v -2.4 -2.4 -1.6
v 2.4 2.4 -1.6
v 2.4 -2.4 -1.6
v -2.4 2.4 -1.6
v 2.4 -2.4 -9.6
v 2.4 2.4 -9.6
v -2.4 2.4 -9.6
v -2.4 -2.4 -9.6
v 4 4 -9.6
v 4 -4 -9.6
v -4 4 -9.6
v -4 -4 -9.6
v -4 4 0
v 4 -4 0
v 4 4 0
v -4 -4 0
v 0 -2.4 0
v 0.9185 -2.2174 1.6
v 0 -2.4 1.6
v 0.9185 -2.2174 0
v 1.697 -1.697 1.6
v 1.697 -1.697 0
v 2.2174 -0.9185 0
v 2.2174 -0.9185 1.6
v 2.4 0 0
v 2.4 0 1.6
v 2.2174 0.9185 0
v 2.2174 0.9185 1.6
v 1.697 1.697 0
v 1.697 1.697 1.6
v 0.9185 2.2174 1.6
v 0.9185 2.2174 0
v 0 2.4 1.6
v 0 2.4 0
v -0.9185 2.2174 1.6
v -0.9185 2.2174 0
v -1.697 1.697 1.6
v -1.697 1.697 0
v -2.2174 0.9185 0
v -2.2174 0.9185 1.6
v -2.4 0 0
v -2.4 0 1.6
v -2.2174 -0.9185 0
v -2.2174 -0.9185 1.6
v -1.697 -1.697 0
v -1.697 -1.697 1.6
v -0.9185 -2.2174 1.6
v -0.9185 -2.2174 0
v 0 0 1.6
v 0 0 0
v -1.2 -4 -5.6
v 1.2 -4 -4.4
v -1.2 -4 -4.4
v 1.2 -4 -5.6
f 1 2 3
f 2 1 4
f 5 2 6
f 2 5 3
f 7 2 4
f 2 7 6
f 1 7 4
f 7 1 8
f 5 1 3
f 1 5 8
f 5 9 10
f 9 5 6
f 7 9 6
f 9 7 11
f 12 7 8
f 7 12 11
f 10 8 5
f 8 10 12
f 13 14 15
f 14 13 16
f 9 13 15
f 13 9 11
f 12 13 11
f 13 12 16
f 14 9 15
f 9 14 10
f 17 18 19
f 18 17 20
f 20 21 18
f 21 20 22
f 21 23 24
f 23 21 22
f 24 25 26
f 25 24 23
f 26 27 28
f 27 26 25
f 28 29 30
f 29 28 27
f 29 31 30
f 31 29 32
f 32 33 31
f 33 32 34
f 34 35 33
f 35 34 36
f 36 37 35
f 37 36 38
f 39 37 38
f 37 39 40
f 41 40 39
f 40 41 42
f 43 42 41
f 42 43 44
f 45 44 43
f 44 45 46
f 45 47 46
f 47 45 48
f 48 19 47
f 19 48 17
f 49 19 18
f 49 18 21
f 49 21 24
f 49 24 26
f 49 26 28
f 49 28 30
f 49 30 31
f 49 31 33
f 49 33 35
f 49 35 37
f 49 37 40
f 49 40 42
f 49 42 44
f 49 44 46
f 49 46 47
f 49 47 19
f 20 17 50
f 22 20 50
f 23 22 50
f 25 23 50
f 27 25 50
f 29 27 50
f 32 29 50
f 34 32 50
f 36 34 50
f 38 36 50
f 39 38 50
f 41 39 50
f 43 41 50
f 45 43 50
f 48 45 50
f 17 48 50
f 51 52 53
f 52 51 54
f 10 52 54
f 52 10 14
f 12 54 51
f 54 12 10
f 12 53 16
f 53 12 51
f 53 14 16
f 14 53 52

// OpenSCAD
// file: ../p/4-4edge.scad
use <../lib.scad>
function ldraw_lib__4_4edge() = [
// 0 Circle 1.0
// 0 Name: 4-4edge.dat
// 0 Author: James Jessiman
// 0 !LDRAW_ORG Primitive UPDATE 2017-01
// 0 !LICENSE Licensed under CC BY 2.0 and CC BY 4.0 : see CAreadme.txt
// 
// 0 BFC CERTIFY CCW
  [0,"BFC","CERTIFY"],
  [0,"BFC","CCW"],
// 
// 0 !HISTORY 1998-12-15 [PTadmin] Official Update 1998-10
// 0 !HISTORY 2005-12-28 [PTadmin] Official Update 2005-01
// 0 !HISTORY 2007-06-24 [PTadmin] Header formatted for Contributor Agreement
// 0 !HISTORY 2008-07-01 [PTadmin] Official Update 2008-01
// 0 !HISTORY 2017-01-15 [Steffen] BFCed
// 0 !HISTORY 2017-12-30 [PTadmin] Official Update 2017-01
// 
// 
// 2 24 1 0 0 0.9239 0 0.3827
  [2,24,1,0,0,0.9239,0,0.3827],
// 2 24 0.9239 0 0.3827 0.7071 0 0.7071
  [2,24,0.9239,0,0.3827,0.7071,0,0.7071],
// 2 24 0.7071 0 0.7071 0.3827 0 0.9239
  [2,24,0.7071,0,0.7071,0.3827,0,0.9239],
// 2 24 0.3827 0 0.9239 0 0 1
  [2,24,0.3827,0,0.9239,0,0,1],
// 2 24 0 0 1 -0.3827 0 0.9239
  [2,24,0,0,1,-0.3827,0,0.9239],
// 2 24 -0.3827 0 0.9239 -0.7071 0 0.7071
  [2,24,-0.3827,0,0.9239,-0.7071,0,0.7071],
// 2 24 -0.7071 0 0.7071 -0.9239 0 0.3827
  [2,24,-0.7071,0,0.7071,-0.9239,0,0.3827],
// 2 24 -0.9239 0 0.3827 -1 0 -0
  [2,24,-0.9239,0,0.3827,-1,0,-0],
// 2 24 -1 0 -0 -0.9239 0 -0.3827
  [2,24,-1,0,-0,-0.9239,0,-0.3827],
// 2 24 -0.9239 0 -0.3827 -0.7071 0 -0.7071
  [2,24,-0.9239,0,-0.3827,-0.7071,0,-0.7071],
// 2 24 -0.7071 0 -0.7071 -0.3827 0 -0.9239
  [2,24,-0.7071,0,-0.7071,-0.3827,0,-0.9239],
// 2 24 -0.3827 0 -0.9239 0 0 -1
  [2,24,-0.3827,0,-0.9239,0,0,-1],
// 2 24 0 0 -1 0.3827 0 -0.9239
  [2,24,0,0,-1,0.3827,0,-0.9239],
// 2 24 0.3827 0 -0.9239 0.7071 0 -0.7071
  [2,24,0.3827,0,-0.9239,0.7071,0,-0.7071],
// 2 24 0.7071 0 -0.7071 0.9239 0 -0.3827
  [2,24,0.7071,0,-0.7071,0.9239,0,-0.3827],
// 2 24 0.9239 0 -0.3827 1 0 0
  [2,24,0.9239,0,-0.3827,1,0,0],
];
module ldraw_lib__4_4edge(step=0, col=false, unit=2/5, alt=false, line=0.2, solid=!$preview)
    makepoly(ldraw_lib__4_4edge(), step=step, col=col, unit=unit, alt=alt, line=line, solid=solid);
ldraw_lib__4_4edge(line=0.2);
// file: ../p/4-4disc.scad
use <../lib.scad>
function ldraw_lib__4_4disc() = [
// 0 Disc 1.0
// 0 Name: 4-4disc.dat
// 0 Author: James Jessiman
// 0 !LDRAW_ORG Primitive UPDATE 2002-02
// 0 !LICENSE Licensed under CC BY 2.0 and CC BY 4.0 : see CAreadme.txt
// 
// 0 BFC CERTIFY CCW
  [0,"BFC","CERTIFY"],
  [0,"BFC","CCW"],
// 
// 0 !HISTORY 1998-12-15 [PTadmin] Official Update 1998-10
// 0 !HISTORY 2002-03-23 [sbliss] Added BFC statement
// 0 !HISTORY 2002-04-25 [PTadmin] Official Update 2002-02
// 0 !HISTORY 2007-06-24 [PTadmin] Header formatted for Contributor Agreement
// 0 !HISTORY 2008-07-01 [PTadmin] Official Update 2008-01
// 
// 
// 3 16 0 0 0 1 0 0 0.9239 0 0.3827
  [3,16,0,0,0,1,0,0,0.9239,0,0.3827],
// 3 16 0 0 0 0.9239 0 0.3827 0.7071 0 0.7071
  [3,16,0,0,0,0.9239,0,0.3827,0.7071,0,0.7071],
// 3 16 0 0 0 0.7071 0 0.7071 0.3827 0 0.9239
  [3,16,0,0,0,0.7071,0,0.7071,0.3827,0,0.9239],
// 3 16 0 0 0 0.3827 0 0.9239 0 0 1
  [3,16,0,0,0,0.3827,0,0.9239,0,0,1],
// 3 16 0 0 0 0 0 1 -0.3827 0 0.9239
  [3,16,0,0,0,0,0,1,-0.3827,0,0.9239],
// 3 16 0 0 0 -0.3827 0 0.9239 -0.7071 0 0.7071
  [3,16,0,0,0,-0.3827,0,0.9239,-0.7071,0,0.7071],
// 3 16 0 0 0 -0.7071 0 0.7071 -0.9239 0 0.3827
  [3,16,0,0,0,-0.7071,0,0.7071,-0.9239,0,0.3827],
// 3 16 0 0 0 -0.9239 0 0.3827 -1 0 -0
  [3,16,0,0,0,-0.9239,0,0.3827,-1,0,-0],
// 3 16 0 0 0 -1 0 -0 -0.9239 0 -0.3827
  [3,16,0,0,0,-1,0,-0,-0.9239,0,-0.3827],
// 3 16 0 0 0 -0.9239 0 -0.3827 -0.7071 0 -0.7071
  [3,16,0,0,0,-0.9239,0,-0.3827,-0.7071,0,-0.7071],
// 3 16 0 0 0 -0.7071 0 -0.7071 -0.3827 0 -0.9239
  [3,16,0,0,0,-0.7071,0,-0.7071,-0.3827,0,-0.9239],
// 3 16 0 0 0 -0.3827 0 -0.9239 0 0 -1
  [3,16,0,0,0,-0.3827,0,-0.9239,0,0,-1],
// 3 16 0 0 0 0 0 -1 0.3827 0 -0.9239
  [3,16,0,0,0,0,0,-1,0.3827,0,-0.9239],
// 3 16 0 0 0 0.3827 0 -0.9239 0.7071 0 -0.7071
  [3,16,0,0,0,0.3827,0,-0.9239,0.7071,0,-0.7071],
// 3 16 0 0 0 0.7071 0 -0.7071 0.9239 0 -0.3827
  [3,16,0,0,0,0.7071,0,-0.7071,0.9239,0,-0.3827],
// 3 16 0 0 0 0.9239 0 -0.3827 1 0 0
  [3,16,0,0,0,0.9239,0,-0.3827,1,0,0],
// 0
];
module ldraw_lib__4_4disc(step=0, col=false, unit=2/5, alt=false, line=0.2, solid=!$preview)
    makepoly(ldraw_lib__4_4disc(), step=step, col=col, unit=unit, alt=alt, line=line, solid=solid);
ldraw_lib__4_4disc(line=0.2);
// file: ../p/4-4cyli.scad
use <../lib.scad>
$fa=1; $fs=0.2;
function ldraw_lib__4_4cyli(realsolid=false) = [
// 0 Cylinder 1.0
// 0 Name: 4-4cyli.dat
// 0 Author: James Jessiman
// 0 !LDRAW_ORG Primitive UPDATE 2005-01
// 0 !LICENSE Licensed under CC BY 2.0 and CC BY 4.0 : see CAreadme.txt
// 
// 0 BFC CERTIFY CCW
  [0,"BFC","CERTIFY"],
  [0,"BFC","CCW"],
// 
// 0 !HISTORY 1998-12-15 [PTadmin] Official Update 1998-10
// 0 !HISTORY 2002-03-23 [sbliss] Added BFC statement; merged headers from files in distributions LDraw 0.27 and Complete.
// 0 !HISTORY 2002-04-25 [PTadmin] Official Update 2002-02
// 0 !HISTORY 2004-12-14 [guyvivan] BFC CCW
// 0 !HISTORY 2005-12-28 [PTadmin] Official Update 2005-01
// 0 !HISTORY 2007-06-24 [PTadmin] Header formatted for Contributor Agreement
// 0 !HISTORY 2008-07-01 [PTadmin] Official Update 2008-01
// 
// 
// 4 16 1 1 0 0.9239 1 0.3827 0.9239 0 0.3827 1 0 0
  [4,16,1,1,0,0.9239,1,0.3827,0.9239,0,0.3827,1,0,0],
// 5 24 1 0 0 1 1 0 0.9239 0 0.3827 0.9239 0 -0.3827
  [5,24,1,0,0,1,1,0,0.9239,0,0.3827,0.9239,0,-0.3827],
// 4 16 0.9239 1 0.3827 0.7071 1 0.7071 0.7071 0 0.7071 0.9239 0 0.3827
  [4,16,0.9239,1,0.3827,0.7071,1,0.7071,0.7071,0,0.7071,0.9239,0,0.3827],
// 5 24 0.9239 0 0.3827 0.9239 1 0.3827 0.7071 0 0.7071 1 0 0
  [5,24,0.9239,0,0.3827,0.9239,1,0.3827,0.7071,0,0.7071,1,0,0],
// 4 16 0.7071 1 0.7071 0.3827 1 0.9239 0.3827 0 0.9239 0.7071 0 0.7071
  [4,16,0.7071,1,0.7071,0.3827,1,0.9239,0.3827,0,0.9239,0.7071,0,0.7071],
// 5 24 0.7071 0 0.7071 0.7071 1 0.7071 0.3827 0 0.9239 0.9239 0 0.3827
  [5,24,0.7071,0,0.7071,0.7071,1,0.7071,0.3827,0,0.9239,0.9239,0,0.3827],
// 4 16 0.3827 1 0.9239 0 1 1 0 0 1 0.3827 0 0.9239
  [4,16,0.3827,1,0.9239,0,1,1,0,0,1,0.3827,0,0.9239],
// 5 24 0.3827 0 0.9239 0.3827 1 0.9239 0 0 1 0.7071 0 0.7071
  [5,24,0.3827,0,0.9239,0.3827,1,0.9239,0,0,1,0.7071,0,0.7071],
// 4 16 0 1 1 -0.3827 1 0.9239 -0.3827 0 0.9239 0 0 1
  [4,16,0,1,1,-0.3827,1,0.9239,-0.3827,0,0.9239,0,0,1],
// 5 24 0 0 1 0 1 1 -0.3827 0 0.9239 0.3827 0 0.9239
  [5,24,0,0,1,0,1,1,-0.3827,0,0.9239,0.3827,0,0.9239],
// 4 16 -0.3827 1 0.9239 -0.7071 1 0.7071 -0.7071 0 0.7071 -0.3827 0 0.9239
  [4,16,-0.3827,1,0.9239,-0.7071,1,0.7071,-0.7071,0,0.7071,-0.3827,0,0.9239],
// 5 24 -0.3827 0 0.9239 -0.3827 1 0.9239 -0.7071 0 0.7071 0 0 1
  [5,24,-0.3827,0,0.9239,-0.3827,1,0.9239,-0.7071,0,0.7071,0,0,1],
// 4 16 -0.7071 1 0.7071 -0.9239 1 0.3827 -0.9239 0 0.3827 -0.7071 0 0.7071
  [4,16,-0.7071,1,0.7071,-0.9239,1,0.3827,-0.9239,0,0.3827,-0.7071,0,0.7071],
// 5 24 -0.7071 0 0.7071 -0.7071 1 0.7071 -0.9239 0 0.3827 -0.3827 0 0.9239
  [5,24,-0.7071,0,0.7071,-0.7071,1,0.7071,-0.9239,0,0.3827,-0.3827,0,0.9239],
// 4 16 -0.9239 1 0.3827 -1 1 0 -1 0 0 -0.9239 0 0.3827
  [4,16,-0.9239,1,0.3827,-1,1,0,-1,0,0,-0.9239,0,0.3827],
// 5 24 -0.9239 0 0.3827 -0.9239 1 0.3827 -1 0 0 -0.7071 0 0.7071
  [5,24,-0.9239,0,0.3827,-0.9239,1,0.3827,-1,0,0,-0.7071,0,0.7071],
// 4 16 -1 1 0 -0.9239 1 -0.3827 -0.9239 0 -0.3827 -1 0 0
  [4,16,-1,1,0,-0.9239,1,-0.3827,-0.9239,0,-0.3827,-1,0,0],
// 5 24 -1 0 0 -1 1 0 -0.9239 0 -0.3827 -0.9239 0 0.3827
  [5,24,-1,0,0,-1,1,0,-0.9239,0,-0.3827,-0.9239,0,0.3827],
// 4 16 -0.9239 1 -0.3827 -0.7071 1 -0.7071 -0.7071 0 -0.7071 -0.9239 0 -0.3827
  [4,16,-0.9239,1,-0.3827,-0.7071,1,-0.7071,-0.7071,0,-0.7071,-0.9239,0,-0.3827],
// 5 24 -0.9239 0 -0.3827 -0.9239 1 -0.3827 -0.7071 0 -0.7071 -1 0 0
  [5,24,-0.9239,0,-0.3827,-0.9239,1,-0.3827,-0.7071,0,-0.7071,-1,0,0],
// 4 16 -0.7071 1 -0.7071 -0.3827 1 -0.9239 -0.3827 0 -0.9239 -0.7071 0 -0.7071
  [4,16,-0.7071,1,-0.7071,-0.3827,1,-0.9239,-0.3827,0,-0.9239,-0.7071,0,-0.7071],
// 5 24 -0.7071 0 -0.7071 -0.7071 1 -0.7071 -0.3827 0 -0.9239 -0.9239 0 -0.3827
  [5,24,-0.7071,0,-0.7071,-0.7071,1,-0.7071,-0.3827,0,-0.9239,-0.9239,0,-0.3827],
// 4 16 -0.3827 1 -0.9239 0 1 -1 0 0 -1 -0.3827 0 -0.9239
  [4,16,-0.3827,1,-0.9239,0,1,-1,0,0,-1,-0.3827,0,-0.9239],
// 5 24 -0.3827 0 -0.9239 -0.3827 1 -0.9239 0 0 -1 -0.7071 0 -0.7071
  [5,24,-0.3827,0,-0.9239,-0.3827,1,-0.9239,0,0,-1,-0.7071,0,-0.7071],
// 4 16 0 1 -1 0.3827 1 -0.9239 0.3827 0 -0.9239 0 0 -1
  [4,16,0,1,-1,0.3827,1,-0.9239,0.3827,0,-0.9239,0,0,-1],
// 5 24 0 0 -1 0 1 -1 0.3827 0 -0.9239 -0.3827 0 -0.9239
  [5,24,0,0,-1,0,1,-1,0.3827,0,-0.9239,-0.3827,0,-0.9239],
// 4 16 0.3827 1 -0.9239 0.7071 1 -0.7071 0.7071 0 -0.7071 0.3827 0 -0.9239
  [4,16,0.3827,1,-0.9239,0.7071,1,-0.7071,0.7071,0,-0.7071,0.3827,0,-0.9239],
// 5 24 0.3827 0 -0.9239 0.3827 1 -0.9239 0.7071 0 -0.7071 0 0 -1
  [5,24,0.3827,0,-0.9239,0.3827,1,-0.9239,0.7071,0,-0.7071,0,0,-1],
// 4 16 0.7071 1 -0.7071 0.9239 1 -0.3827 0.9239 0 -0.3827 0.7071 0 -0.7071
  [4,16,0.7071,1,-0.7071,0.9239,1,-0.3827,0.9239,0,-0.3827,0.7071,0,-0.7071],
// 5 24 0.7071 0 -0.7071 0.7071 1 -0.7071 0.9239 0 -0.3827 0.3827 0 -0.9239
  [5,24,0.7071,0,-0.7071,0.7071,1,-0.7071,0.9239,0,-0.3827,0.3827,0,-0.9239],
// 4 16 0.9239 1 -0.3827 1 1 0 1 0 0 0.9239 0 -0.3827
  [4,16,0.9239,1,-0.3827,1,1,0,1,0,0,0.9239,0,-0.3827],
// 5 24 0.9239 0 -0.3827 0.9239 1 -0.3827 1 0 0 0.7071 0 -0.7071
  [5,24,0.9239,0,-0.3827,0.9239,1,-0.3827,1,0,0,0.7071,0,-0.7071],
// 0
];
module ldraw_lib__4_4cyli(step=0, col=false, unit=2/5, alt=false, line=0.2, solid=!$preview)
    makepoly(ldraw_lib__4_4cyli(solid), step=step, col=col, unit=unit, alt=alt, line=line, solid=solid);
ldraw_lib__4_4cyli(line=0.2);
// file: ../p/stud.scad
use <../lib.scad>
use <4-4cyli.scad>
use <4-4disc.scad>
use <4-4edge.scad>
function ldraw_lib__stud() = [
// 0 Stud
// 0 Name: stud.dat
// 0 Author: James Jessiman
// 0 !LDRAW_ORG Primitive UPDATE 2012-01
// 0 !LICENSE Licensed under CC BY 4.0 : see CAreadme.txt
// 
// 0 BFC CERTIFY CCW
  [0,"BFC","CERTIFY"],
  [0,"BFC","CCW"],
// 
// 0 !HISTORY 2002-04-04 [sbliss] Modified for BFC compliance
// 0 !HISTORY 2002-04-25 [PTadmin] Official Update 2002-02
// 0 !HISTORY 2007-06-24 [PTadmin] Header formatted for Contributor Agreement
// 0 !HISTORY 2008-07-01 [PTadmin] Official Update 2008-01
// 0 !HISTORY 2012-02-16 [Philo] Changed to CCW
// 0 !HISTORY 2012-03-30 [PTadmin] Official Update 2012-01
// 
// 
// 1 16 0 0 0 6 0 0 0 1 0 0 0 6 4-4edge.dat
  [1,16,0,0,0,6,0,0,0,1,0,0,0,6, ldraw_lib__4_4edge()],
// 1 16 0 -4 0 6 0 0 0 1 0 0 0 6 4-4edge.dat
  [1,16,0,-4,0,6,0,0,0,1,0,0,0,6, ldraw_lib__4_4edge()],
// 1 16 0 0 0 6 0 0 0 -4 0 0 0 6 4-4cyli.dat
  [1,16,0,0,0,6,0,0,0,-4,0,0,0,6, ldraw_lib__4_4cyli()],
// 1 16 0 -4 0 6 0 0 0 1 0 0 0 6 4-4disc.dat
  [1,16,0,-4,0,6,0,0,0,1,0,0,0,6, ldraw_lib__4_4disc()],
  [-1,16,0,0,0,6,0,0,0,-1,0,0,0,6, ldraw_lib__4_4disc()],
];
module ldraw_lib__stud(step=0, col=false, unit=2/5, alt=false, line=0.2, solid=!$preview)
    makepoly(ldraw_lib__stud(), step=step, col=col, unit=unit, alt=alt, line=line, solid=solid);
ldraw_lib__stud(line=0.2);
// file: ../p/box5.scad
use <../lib.scad>
function ldraw_lib__box5() = [
// 0 Box with 5 Faces and All Edges
// 0 Name: box5.dat
// 0 Author: James Jessiman
// 0 !LDRAW_ORG Primitive UPDATE 2012-01
// 0 !LICENSE Licensed under CC BY 2.0 and CC BY 4.0 : see CAreadme.txt
// 
// 0 BFC CERTIFY CCW
  [0,"BFC","CERTIFY"],
  [0,"BFC","CCW"],
// 
// 0 !HISTORY 2002-04-03 [sbliss] Modified for BFC compliance
// 0 !HISTORY 2002-04-25 [PTadmin] Official Update 2002-02
// 0 !HISTORY 2007-06-24 [PTadmin] Header formatted for Contributor Agreement
// 0 !HISTORY 2008-07-01 [PTadmin] Official Update 2008-01
// 0 !HISTORY 2012-02-16 [Philo] Changed to CCW
// 0 !HISTORY 2012-03-30 [PTadmin] Official Update 2012-01
// 
// 
// 2 24 1 1 1 -1 1 1
  [2,24,1,1,1,-1,1,1],
// 2 24 -1 1 1 -1 1 -1
  [2,24,-1,1,1,-1,1,-1],
// 2 24 -1 1 -1 1 1 -1
  [2,24,-1,1,-1,1,1,-1],
// 2 24 1 1 -1 1 1 1
  [2,24,1,1,-1,1,1,1],
// 2 24 1 0 1 -1 0 1
  [2,24,1,0,1,-1,0,1],
// 2 24 -1 0 1 -1 0 -1
  [2,24,-1,0,1,-1,0,-1],
// 2 24 -1 0 -1 1 0 -1
  [2,24,-1,0,-1,1,0,-1],
// 2 24 1 0 -1 1 0 1
  [2,24,1,0,-1,1,0,1],
// 2 24 1 0 1 1 1 1
  [2,24,1,0,1,1,1,1],
// 2 24 -1 0 1 -1 1 1
  [2,24,-1,0,1,-1,1,1],
// 2 24 1 0 -1 1 1 -1
  [2,24,1,0,-1,1,1,-1],
// 2 24 -1 0 -1 -1 1 -1
  [2,24,-1,0,-1,-1,1,-1],
// 4 16 -1 1 1 1 1 1 1 1 -1 -1 1 -1
  [4,16,-1,1,1,1,1,1,1,1,-1,-1,1,-1],
// 4 16 -1 1 1 -1 0 1 1 0 1 1 1 1
  [4,16,-1,1,1,-1,0,1,1,0,1,1,1,1],
// 4 16 -1 1 -1 -1 0 -1 -1 0 1 -1 1 1
  [4,16,-1,1,-1,-1,0,-1,-1,0,1,-1,1,1],
// 4 16 1 1 -1 1 0 -1 -1 0 -1 -1 1 -1
  [4,16,1,1,-1,1,0,-1,-1,0,-1,-1,1,-1],
// 4 16 1 1 1 1 0 1 1 0 -1 1 1 -1
  [4,16,1,1,1,1,0,1,1,0,-1,1,1,-1],
];
makepoly(ldraw_lib__box5(), line=0.2);
// file: ../p/box4t.scad
use <../lib.scad>
function ldraw_lib__box4t() = [
// 0 Box with 4 Adjacent Faces and All Edges
// 0 Name: box4t.dat
// 0 Author: Tore Eriksson [Tore_Eriksson]
// 0 !LDRAW_ORG Primitive UPDATE 2003-02
// 0 !LICENSE Licensed under CC BY 2.0 and CC BY 4.0 : see CAreadme.txt
// 
// 0 BFC CERTIFY CCW
  [0,"BFC","CERTIFY"],
  [0,"BFC","CCW"],
// 
// 0 !HISTORY 1997-09-29 [PTadmin] Official Update 1997-15
// 0 !HISTORY 2002-08-31 [izanette] Modified with WINDZ for BFC compliance
// 0 !HISTORY 2003-08-01 [PTadmin] Official Update 2003-02
// 0 !HISTORY 2007-06-24 [PTadmin] Header formatted for Contributor Agreement
// 0 !HISTORY 2008-07-01 [PTadmin] Official Update 2008-01
// 
// 
// 2 24 1 1 1 -1 1 1
  [2,24,1,1,1,-1,1,1],
// 2 24 -1 1 1 -1 1 -1
  [2,24,-1,1,1,-1,1,-1],
// 2 24 -1 1 -1 1 1 -1
  [2,24,-1,1,-1,1,1,-1],
// 2 24 1 1 -1 1 1 1
  [2,24,1,1,-1,1,1,1],
// 2 24 1 0 1 -1 0 1
  [2,24,1,0,1,-1,0,1],
// 2 24 -1 0 1 -1 0 -1
  [2,24,-1,0,1,-1,0,-1],
// 2 24 -1 0 -1 1 0 -1
  [2,24,-1,0,-1,1,0,-1],
// 2 24 1 0 -1 1 0 1
  [2,24,1,0,-1,1,0,1],
// 2 24 1 0 1 1 1 1
  [2,24,1,0,1,1,1,1],
// 2 24 -1 0 1 -1 1 1
  [2,24,-1,0,1,-1,1,1],
// 2 24 1 0 -1 1 1 -1
  [2,24,1,0,-1,1,1,-1],
// 2 24 -1 0 -1 -1 1 -1
  [2,24,-1,0,-1,-1,1,-1],
// 4 16 1 1 1 1 1 -1 -1 1 -1 -1 1 1
  [4,16,1,1,1,1,1,-1,-1,1,-1,-1,1,1],
// 4 16 1 1 1 -1 1 1 -1 0 1 1 0 1
  [4,16,1,1,1,-1,1,1,-1,0,1,1,0,1],
// 4 16 -1 1 1 -1 1 -1 -1 0 -1 -1 0 1
  [4,16,-1,1,1,-1,1,-1,-1,0,-1,-1,0,1],
// 0 4 16 -1 1 -1 -1 0 -1 1 0 -1 1 1 -1
// 4 16 1 1 -1 1 1 1 1 0 1 1 0 -1
  [4,16,1,1,-1,1,1,1,1,0,1,1,0,-1],
// 0
];
makepoly(ldraw_lib__box4t(), line=0.2);
// file: s/3005s01.scad
use <../../lib.scad>
use <../../p/box4t.scad>
use <../../p/box5.scad>
use <../../p/stud.scad>
function ldraw_lib__s__3005s01() = [
// 0 ~Brick  1 x  1 without Front Face
// 0 Name: s\3005s01.dat
// 0 Author: John Riley [jriley]
// 0 !LDRAW_ORG Subpart UPDATE 2004-01
// 0 !LICENSE Licensed under CC BY 2.0 and CC BY 4.0 : see CAreadme.txt
// 
// 0 BFC CERTIFY CCW
  [0,"BFC","CERTIFY"],
  [0,"BFC","CCW"],
// 
// 0 !HISTORY 2003-09-07 [jriley] BFCed & Subfiled
// 0 !HISTORY 2004-03-02 [PTadmin] Official Update 2004-01
// 0 !HISTORY 2007-08-29 [PTadmin] Header formatted for Contributor Agreement
// 0 !HISTORY 2008-07-01 [PTadmin] Official Update 2008-01
// 
// 
// 0 BFC INVERTNEXT
  [0,"BFC","INVERTNEXT"],
// 1 16 0 24 0 0 0 6 0 -20 0 -6 0 0 box5.dat
  [1,16,0,24,0,0,0,6,0,-20,0,-6,0,0, ldraw_lib__box5()],
// 4 16 10 24 -10 6 24 -6 6 24 6 10 24 10
  [4,16,10,24,-10,6,24,-6,6,24,6,10,24,10],
// 4 16 10 24 10 6 24 6 -6 24 6 -10 24 10
  [4,16,10,24,10,6,24,6,-6,24,6,-10,24,10],
// 4 16 -10 24 10 -6 24 6 -6 24 -6 -10 24 -10
  [4,16,-10,24,10,-6,24,6,-6,24,-6,-10,24,-10],
// 4 16 -10 24 -10 -6 24 -6 6 24 -6 10 24 -10
  [4,16,-10,24,-10,-6,24,-6,6,24,-6,10,24,-10],
// 1 16 0 24 0 10 0 0 0 -24 0 0 0 10 box4t.dat
  [1,16,0,24,0,10,0,0,0,-24,0,0,0,10, ldraw_lib__box4t()],
// 1 16 0 0 0 0 0 1 0 1 0 -1 0 0 stud.dat
  [1,16,0,0,0,0,0,1,0,1,0,-1,0,0, ldraw_lib__stud()],
// 0
];
module ldraw_lib__s__3005s01(step=0, col=false, unit=2/5, alt=false, line=0.2, solid=!$preview)
    makepoly(ldraw_lib__s__3005s01(), step=step, col=col, unit=unit, alt=alt, line=line, solid=solid);
ldraw_lib__s__3005s01(line=0.2);
// main file
use <../lib.scad>
use <s/3005s01.scad>
function ldraw_lib__3005pwm() = [
// 0 Brick  1 x  1 with Lightblue Subtraction Pattern
// 0 Name: 3005pwm.dat
// 0 Author: Tore Eriksson [Tore_Eriksson]
// 0 !LDRAW_ORG Part UPDATE 2025-09
// 0 !LICENSE Licensed under CC BY 4.0 : see CAreadme.txt
// 
// 0 BFC CERTIFY CCW
  [0,"BFC","CERTIFY"],
  [0,"BFC","CCW"],
// 
// 0 !KEYWORDS dash, letters, minus, numbers, Set Unknown
// 
// 0 !HISTORY 2004-04-22 [PTadmin] Official Update 2004-02
// 0 !HISTORY 2007-05-11 [PTadmin] Header formatted for Contributor Agreement
// 0 !HISTORY 2008-07-01 [PTadmin] Official Update 2008-01
// 0 !HISTORY 2025-09-27 [OrionP] Changed winding to CCW
// 0 !HISTORY 2025-09-29 [OrionP] Official Update 2025-09
// 
// 1 16 0 0 0 1 0 0 0 1 0 0 0 1 s\3005s01.dat
  [1,16,0,0,0,1,0,0,0,1,0,0,0,1, ldraw_lib__s__3005s01()],
// 
// 4 9 -3 14 -10 3 14 -10 3 11 -10 -3 11 -10
  [4,9,-3,14,-10,3,14,-10,3,11,-10,-3,11,-10],
// 4 16 10 0 -10 3 11 -10 3 14 -10 10 24 -10
  [4,16,10,0,-10,3,11,-10,3,14,-10,10,24,-10],
// 4 16 10 24 -10 3 14 -10 -3 14 -10 -10 24 -10
  [4,16,10,24,-10,3,14,-10,-3,14,-10,-10,24,-10],
// 4 16 -10 24 -10 -3 14 -10 -3 11 -10 -10 0 -10
  [4,16,-10,24,-10,-3,14,-10,-3,11,-10,-10,0,-10],
// 4 16 -3 11 -10 3 11 -10 10 0 -10 -10 0 -10
  [4,16,-3,11,-10,3,11,-10,10,0,-10,-10,0,-10],
// 0
];
module ldraw_lib__3005pwm(step=0, col=false, unit=2/5, alt=false, line=0.2, solid=!$preview)
    makepoly(ldraw_lib__3005pwm(), step=step, col=col, unit=unit, alt=alt, line=line, solid=solid);
ldraw_lib__3005pwm(line=0.2);
